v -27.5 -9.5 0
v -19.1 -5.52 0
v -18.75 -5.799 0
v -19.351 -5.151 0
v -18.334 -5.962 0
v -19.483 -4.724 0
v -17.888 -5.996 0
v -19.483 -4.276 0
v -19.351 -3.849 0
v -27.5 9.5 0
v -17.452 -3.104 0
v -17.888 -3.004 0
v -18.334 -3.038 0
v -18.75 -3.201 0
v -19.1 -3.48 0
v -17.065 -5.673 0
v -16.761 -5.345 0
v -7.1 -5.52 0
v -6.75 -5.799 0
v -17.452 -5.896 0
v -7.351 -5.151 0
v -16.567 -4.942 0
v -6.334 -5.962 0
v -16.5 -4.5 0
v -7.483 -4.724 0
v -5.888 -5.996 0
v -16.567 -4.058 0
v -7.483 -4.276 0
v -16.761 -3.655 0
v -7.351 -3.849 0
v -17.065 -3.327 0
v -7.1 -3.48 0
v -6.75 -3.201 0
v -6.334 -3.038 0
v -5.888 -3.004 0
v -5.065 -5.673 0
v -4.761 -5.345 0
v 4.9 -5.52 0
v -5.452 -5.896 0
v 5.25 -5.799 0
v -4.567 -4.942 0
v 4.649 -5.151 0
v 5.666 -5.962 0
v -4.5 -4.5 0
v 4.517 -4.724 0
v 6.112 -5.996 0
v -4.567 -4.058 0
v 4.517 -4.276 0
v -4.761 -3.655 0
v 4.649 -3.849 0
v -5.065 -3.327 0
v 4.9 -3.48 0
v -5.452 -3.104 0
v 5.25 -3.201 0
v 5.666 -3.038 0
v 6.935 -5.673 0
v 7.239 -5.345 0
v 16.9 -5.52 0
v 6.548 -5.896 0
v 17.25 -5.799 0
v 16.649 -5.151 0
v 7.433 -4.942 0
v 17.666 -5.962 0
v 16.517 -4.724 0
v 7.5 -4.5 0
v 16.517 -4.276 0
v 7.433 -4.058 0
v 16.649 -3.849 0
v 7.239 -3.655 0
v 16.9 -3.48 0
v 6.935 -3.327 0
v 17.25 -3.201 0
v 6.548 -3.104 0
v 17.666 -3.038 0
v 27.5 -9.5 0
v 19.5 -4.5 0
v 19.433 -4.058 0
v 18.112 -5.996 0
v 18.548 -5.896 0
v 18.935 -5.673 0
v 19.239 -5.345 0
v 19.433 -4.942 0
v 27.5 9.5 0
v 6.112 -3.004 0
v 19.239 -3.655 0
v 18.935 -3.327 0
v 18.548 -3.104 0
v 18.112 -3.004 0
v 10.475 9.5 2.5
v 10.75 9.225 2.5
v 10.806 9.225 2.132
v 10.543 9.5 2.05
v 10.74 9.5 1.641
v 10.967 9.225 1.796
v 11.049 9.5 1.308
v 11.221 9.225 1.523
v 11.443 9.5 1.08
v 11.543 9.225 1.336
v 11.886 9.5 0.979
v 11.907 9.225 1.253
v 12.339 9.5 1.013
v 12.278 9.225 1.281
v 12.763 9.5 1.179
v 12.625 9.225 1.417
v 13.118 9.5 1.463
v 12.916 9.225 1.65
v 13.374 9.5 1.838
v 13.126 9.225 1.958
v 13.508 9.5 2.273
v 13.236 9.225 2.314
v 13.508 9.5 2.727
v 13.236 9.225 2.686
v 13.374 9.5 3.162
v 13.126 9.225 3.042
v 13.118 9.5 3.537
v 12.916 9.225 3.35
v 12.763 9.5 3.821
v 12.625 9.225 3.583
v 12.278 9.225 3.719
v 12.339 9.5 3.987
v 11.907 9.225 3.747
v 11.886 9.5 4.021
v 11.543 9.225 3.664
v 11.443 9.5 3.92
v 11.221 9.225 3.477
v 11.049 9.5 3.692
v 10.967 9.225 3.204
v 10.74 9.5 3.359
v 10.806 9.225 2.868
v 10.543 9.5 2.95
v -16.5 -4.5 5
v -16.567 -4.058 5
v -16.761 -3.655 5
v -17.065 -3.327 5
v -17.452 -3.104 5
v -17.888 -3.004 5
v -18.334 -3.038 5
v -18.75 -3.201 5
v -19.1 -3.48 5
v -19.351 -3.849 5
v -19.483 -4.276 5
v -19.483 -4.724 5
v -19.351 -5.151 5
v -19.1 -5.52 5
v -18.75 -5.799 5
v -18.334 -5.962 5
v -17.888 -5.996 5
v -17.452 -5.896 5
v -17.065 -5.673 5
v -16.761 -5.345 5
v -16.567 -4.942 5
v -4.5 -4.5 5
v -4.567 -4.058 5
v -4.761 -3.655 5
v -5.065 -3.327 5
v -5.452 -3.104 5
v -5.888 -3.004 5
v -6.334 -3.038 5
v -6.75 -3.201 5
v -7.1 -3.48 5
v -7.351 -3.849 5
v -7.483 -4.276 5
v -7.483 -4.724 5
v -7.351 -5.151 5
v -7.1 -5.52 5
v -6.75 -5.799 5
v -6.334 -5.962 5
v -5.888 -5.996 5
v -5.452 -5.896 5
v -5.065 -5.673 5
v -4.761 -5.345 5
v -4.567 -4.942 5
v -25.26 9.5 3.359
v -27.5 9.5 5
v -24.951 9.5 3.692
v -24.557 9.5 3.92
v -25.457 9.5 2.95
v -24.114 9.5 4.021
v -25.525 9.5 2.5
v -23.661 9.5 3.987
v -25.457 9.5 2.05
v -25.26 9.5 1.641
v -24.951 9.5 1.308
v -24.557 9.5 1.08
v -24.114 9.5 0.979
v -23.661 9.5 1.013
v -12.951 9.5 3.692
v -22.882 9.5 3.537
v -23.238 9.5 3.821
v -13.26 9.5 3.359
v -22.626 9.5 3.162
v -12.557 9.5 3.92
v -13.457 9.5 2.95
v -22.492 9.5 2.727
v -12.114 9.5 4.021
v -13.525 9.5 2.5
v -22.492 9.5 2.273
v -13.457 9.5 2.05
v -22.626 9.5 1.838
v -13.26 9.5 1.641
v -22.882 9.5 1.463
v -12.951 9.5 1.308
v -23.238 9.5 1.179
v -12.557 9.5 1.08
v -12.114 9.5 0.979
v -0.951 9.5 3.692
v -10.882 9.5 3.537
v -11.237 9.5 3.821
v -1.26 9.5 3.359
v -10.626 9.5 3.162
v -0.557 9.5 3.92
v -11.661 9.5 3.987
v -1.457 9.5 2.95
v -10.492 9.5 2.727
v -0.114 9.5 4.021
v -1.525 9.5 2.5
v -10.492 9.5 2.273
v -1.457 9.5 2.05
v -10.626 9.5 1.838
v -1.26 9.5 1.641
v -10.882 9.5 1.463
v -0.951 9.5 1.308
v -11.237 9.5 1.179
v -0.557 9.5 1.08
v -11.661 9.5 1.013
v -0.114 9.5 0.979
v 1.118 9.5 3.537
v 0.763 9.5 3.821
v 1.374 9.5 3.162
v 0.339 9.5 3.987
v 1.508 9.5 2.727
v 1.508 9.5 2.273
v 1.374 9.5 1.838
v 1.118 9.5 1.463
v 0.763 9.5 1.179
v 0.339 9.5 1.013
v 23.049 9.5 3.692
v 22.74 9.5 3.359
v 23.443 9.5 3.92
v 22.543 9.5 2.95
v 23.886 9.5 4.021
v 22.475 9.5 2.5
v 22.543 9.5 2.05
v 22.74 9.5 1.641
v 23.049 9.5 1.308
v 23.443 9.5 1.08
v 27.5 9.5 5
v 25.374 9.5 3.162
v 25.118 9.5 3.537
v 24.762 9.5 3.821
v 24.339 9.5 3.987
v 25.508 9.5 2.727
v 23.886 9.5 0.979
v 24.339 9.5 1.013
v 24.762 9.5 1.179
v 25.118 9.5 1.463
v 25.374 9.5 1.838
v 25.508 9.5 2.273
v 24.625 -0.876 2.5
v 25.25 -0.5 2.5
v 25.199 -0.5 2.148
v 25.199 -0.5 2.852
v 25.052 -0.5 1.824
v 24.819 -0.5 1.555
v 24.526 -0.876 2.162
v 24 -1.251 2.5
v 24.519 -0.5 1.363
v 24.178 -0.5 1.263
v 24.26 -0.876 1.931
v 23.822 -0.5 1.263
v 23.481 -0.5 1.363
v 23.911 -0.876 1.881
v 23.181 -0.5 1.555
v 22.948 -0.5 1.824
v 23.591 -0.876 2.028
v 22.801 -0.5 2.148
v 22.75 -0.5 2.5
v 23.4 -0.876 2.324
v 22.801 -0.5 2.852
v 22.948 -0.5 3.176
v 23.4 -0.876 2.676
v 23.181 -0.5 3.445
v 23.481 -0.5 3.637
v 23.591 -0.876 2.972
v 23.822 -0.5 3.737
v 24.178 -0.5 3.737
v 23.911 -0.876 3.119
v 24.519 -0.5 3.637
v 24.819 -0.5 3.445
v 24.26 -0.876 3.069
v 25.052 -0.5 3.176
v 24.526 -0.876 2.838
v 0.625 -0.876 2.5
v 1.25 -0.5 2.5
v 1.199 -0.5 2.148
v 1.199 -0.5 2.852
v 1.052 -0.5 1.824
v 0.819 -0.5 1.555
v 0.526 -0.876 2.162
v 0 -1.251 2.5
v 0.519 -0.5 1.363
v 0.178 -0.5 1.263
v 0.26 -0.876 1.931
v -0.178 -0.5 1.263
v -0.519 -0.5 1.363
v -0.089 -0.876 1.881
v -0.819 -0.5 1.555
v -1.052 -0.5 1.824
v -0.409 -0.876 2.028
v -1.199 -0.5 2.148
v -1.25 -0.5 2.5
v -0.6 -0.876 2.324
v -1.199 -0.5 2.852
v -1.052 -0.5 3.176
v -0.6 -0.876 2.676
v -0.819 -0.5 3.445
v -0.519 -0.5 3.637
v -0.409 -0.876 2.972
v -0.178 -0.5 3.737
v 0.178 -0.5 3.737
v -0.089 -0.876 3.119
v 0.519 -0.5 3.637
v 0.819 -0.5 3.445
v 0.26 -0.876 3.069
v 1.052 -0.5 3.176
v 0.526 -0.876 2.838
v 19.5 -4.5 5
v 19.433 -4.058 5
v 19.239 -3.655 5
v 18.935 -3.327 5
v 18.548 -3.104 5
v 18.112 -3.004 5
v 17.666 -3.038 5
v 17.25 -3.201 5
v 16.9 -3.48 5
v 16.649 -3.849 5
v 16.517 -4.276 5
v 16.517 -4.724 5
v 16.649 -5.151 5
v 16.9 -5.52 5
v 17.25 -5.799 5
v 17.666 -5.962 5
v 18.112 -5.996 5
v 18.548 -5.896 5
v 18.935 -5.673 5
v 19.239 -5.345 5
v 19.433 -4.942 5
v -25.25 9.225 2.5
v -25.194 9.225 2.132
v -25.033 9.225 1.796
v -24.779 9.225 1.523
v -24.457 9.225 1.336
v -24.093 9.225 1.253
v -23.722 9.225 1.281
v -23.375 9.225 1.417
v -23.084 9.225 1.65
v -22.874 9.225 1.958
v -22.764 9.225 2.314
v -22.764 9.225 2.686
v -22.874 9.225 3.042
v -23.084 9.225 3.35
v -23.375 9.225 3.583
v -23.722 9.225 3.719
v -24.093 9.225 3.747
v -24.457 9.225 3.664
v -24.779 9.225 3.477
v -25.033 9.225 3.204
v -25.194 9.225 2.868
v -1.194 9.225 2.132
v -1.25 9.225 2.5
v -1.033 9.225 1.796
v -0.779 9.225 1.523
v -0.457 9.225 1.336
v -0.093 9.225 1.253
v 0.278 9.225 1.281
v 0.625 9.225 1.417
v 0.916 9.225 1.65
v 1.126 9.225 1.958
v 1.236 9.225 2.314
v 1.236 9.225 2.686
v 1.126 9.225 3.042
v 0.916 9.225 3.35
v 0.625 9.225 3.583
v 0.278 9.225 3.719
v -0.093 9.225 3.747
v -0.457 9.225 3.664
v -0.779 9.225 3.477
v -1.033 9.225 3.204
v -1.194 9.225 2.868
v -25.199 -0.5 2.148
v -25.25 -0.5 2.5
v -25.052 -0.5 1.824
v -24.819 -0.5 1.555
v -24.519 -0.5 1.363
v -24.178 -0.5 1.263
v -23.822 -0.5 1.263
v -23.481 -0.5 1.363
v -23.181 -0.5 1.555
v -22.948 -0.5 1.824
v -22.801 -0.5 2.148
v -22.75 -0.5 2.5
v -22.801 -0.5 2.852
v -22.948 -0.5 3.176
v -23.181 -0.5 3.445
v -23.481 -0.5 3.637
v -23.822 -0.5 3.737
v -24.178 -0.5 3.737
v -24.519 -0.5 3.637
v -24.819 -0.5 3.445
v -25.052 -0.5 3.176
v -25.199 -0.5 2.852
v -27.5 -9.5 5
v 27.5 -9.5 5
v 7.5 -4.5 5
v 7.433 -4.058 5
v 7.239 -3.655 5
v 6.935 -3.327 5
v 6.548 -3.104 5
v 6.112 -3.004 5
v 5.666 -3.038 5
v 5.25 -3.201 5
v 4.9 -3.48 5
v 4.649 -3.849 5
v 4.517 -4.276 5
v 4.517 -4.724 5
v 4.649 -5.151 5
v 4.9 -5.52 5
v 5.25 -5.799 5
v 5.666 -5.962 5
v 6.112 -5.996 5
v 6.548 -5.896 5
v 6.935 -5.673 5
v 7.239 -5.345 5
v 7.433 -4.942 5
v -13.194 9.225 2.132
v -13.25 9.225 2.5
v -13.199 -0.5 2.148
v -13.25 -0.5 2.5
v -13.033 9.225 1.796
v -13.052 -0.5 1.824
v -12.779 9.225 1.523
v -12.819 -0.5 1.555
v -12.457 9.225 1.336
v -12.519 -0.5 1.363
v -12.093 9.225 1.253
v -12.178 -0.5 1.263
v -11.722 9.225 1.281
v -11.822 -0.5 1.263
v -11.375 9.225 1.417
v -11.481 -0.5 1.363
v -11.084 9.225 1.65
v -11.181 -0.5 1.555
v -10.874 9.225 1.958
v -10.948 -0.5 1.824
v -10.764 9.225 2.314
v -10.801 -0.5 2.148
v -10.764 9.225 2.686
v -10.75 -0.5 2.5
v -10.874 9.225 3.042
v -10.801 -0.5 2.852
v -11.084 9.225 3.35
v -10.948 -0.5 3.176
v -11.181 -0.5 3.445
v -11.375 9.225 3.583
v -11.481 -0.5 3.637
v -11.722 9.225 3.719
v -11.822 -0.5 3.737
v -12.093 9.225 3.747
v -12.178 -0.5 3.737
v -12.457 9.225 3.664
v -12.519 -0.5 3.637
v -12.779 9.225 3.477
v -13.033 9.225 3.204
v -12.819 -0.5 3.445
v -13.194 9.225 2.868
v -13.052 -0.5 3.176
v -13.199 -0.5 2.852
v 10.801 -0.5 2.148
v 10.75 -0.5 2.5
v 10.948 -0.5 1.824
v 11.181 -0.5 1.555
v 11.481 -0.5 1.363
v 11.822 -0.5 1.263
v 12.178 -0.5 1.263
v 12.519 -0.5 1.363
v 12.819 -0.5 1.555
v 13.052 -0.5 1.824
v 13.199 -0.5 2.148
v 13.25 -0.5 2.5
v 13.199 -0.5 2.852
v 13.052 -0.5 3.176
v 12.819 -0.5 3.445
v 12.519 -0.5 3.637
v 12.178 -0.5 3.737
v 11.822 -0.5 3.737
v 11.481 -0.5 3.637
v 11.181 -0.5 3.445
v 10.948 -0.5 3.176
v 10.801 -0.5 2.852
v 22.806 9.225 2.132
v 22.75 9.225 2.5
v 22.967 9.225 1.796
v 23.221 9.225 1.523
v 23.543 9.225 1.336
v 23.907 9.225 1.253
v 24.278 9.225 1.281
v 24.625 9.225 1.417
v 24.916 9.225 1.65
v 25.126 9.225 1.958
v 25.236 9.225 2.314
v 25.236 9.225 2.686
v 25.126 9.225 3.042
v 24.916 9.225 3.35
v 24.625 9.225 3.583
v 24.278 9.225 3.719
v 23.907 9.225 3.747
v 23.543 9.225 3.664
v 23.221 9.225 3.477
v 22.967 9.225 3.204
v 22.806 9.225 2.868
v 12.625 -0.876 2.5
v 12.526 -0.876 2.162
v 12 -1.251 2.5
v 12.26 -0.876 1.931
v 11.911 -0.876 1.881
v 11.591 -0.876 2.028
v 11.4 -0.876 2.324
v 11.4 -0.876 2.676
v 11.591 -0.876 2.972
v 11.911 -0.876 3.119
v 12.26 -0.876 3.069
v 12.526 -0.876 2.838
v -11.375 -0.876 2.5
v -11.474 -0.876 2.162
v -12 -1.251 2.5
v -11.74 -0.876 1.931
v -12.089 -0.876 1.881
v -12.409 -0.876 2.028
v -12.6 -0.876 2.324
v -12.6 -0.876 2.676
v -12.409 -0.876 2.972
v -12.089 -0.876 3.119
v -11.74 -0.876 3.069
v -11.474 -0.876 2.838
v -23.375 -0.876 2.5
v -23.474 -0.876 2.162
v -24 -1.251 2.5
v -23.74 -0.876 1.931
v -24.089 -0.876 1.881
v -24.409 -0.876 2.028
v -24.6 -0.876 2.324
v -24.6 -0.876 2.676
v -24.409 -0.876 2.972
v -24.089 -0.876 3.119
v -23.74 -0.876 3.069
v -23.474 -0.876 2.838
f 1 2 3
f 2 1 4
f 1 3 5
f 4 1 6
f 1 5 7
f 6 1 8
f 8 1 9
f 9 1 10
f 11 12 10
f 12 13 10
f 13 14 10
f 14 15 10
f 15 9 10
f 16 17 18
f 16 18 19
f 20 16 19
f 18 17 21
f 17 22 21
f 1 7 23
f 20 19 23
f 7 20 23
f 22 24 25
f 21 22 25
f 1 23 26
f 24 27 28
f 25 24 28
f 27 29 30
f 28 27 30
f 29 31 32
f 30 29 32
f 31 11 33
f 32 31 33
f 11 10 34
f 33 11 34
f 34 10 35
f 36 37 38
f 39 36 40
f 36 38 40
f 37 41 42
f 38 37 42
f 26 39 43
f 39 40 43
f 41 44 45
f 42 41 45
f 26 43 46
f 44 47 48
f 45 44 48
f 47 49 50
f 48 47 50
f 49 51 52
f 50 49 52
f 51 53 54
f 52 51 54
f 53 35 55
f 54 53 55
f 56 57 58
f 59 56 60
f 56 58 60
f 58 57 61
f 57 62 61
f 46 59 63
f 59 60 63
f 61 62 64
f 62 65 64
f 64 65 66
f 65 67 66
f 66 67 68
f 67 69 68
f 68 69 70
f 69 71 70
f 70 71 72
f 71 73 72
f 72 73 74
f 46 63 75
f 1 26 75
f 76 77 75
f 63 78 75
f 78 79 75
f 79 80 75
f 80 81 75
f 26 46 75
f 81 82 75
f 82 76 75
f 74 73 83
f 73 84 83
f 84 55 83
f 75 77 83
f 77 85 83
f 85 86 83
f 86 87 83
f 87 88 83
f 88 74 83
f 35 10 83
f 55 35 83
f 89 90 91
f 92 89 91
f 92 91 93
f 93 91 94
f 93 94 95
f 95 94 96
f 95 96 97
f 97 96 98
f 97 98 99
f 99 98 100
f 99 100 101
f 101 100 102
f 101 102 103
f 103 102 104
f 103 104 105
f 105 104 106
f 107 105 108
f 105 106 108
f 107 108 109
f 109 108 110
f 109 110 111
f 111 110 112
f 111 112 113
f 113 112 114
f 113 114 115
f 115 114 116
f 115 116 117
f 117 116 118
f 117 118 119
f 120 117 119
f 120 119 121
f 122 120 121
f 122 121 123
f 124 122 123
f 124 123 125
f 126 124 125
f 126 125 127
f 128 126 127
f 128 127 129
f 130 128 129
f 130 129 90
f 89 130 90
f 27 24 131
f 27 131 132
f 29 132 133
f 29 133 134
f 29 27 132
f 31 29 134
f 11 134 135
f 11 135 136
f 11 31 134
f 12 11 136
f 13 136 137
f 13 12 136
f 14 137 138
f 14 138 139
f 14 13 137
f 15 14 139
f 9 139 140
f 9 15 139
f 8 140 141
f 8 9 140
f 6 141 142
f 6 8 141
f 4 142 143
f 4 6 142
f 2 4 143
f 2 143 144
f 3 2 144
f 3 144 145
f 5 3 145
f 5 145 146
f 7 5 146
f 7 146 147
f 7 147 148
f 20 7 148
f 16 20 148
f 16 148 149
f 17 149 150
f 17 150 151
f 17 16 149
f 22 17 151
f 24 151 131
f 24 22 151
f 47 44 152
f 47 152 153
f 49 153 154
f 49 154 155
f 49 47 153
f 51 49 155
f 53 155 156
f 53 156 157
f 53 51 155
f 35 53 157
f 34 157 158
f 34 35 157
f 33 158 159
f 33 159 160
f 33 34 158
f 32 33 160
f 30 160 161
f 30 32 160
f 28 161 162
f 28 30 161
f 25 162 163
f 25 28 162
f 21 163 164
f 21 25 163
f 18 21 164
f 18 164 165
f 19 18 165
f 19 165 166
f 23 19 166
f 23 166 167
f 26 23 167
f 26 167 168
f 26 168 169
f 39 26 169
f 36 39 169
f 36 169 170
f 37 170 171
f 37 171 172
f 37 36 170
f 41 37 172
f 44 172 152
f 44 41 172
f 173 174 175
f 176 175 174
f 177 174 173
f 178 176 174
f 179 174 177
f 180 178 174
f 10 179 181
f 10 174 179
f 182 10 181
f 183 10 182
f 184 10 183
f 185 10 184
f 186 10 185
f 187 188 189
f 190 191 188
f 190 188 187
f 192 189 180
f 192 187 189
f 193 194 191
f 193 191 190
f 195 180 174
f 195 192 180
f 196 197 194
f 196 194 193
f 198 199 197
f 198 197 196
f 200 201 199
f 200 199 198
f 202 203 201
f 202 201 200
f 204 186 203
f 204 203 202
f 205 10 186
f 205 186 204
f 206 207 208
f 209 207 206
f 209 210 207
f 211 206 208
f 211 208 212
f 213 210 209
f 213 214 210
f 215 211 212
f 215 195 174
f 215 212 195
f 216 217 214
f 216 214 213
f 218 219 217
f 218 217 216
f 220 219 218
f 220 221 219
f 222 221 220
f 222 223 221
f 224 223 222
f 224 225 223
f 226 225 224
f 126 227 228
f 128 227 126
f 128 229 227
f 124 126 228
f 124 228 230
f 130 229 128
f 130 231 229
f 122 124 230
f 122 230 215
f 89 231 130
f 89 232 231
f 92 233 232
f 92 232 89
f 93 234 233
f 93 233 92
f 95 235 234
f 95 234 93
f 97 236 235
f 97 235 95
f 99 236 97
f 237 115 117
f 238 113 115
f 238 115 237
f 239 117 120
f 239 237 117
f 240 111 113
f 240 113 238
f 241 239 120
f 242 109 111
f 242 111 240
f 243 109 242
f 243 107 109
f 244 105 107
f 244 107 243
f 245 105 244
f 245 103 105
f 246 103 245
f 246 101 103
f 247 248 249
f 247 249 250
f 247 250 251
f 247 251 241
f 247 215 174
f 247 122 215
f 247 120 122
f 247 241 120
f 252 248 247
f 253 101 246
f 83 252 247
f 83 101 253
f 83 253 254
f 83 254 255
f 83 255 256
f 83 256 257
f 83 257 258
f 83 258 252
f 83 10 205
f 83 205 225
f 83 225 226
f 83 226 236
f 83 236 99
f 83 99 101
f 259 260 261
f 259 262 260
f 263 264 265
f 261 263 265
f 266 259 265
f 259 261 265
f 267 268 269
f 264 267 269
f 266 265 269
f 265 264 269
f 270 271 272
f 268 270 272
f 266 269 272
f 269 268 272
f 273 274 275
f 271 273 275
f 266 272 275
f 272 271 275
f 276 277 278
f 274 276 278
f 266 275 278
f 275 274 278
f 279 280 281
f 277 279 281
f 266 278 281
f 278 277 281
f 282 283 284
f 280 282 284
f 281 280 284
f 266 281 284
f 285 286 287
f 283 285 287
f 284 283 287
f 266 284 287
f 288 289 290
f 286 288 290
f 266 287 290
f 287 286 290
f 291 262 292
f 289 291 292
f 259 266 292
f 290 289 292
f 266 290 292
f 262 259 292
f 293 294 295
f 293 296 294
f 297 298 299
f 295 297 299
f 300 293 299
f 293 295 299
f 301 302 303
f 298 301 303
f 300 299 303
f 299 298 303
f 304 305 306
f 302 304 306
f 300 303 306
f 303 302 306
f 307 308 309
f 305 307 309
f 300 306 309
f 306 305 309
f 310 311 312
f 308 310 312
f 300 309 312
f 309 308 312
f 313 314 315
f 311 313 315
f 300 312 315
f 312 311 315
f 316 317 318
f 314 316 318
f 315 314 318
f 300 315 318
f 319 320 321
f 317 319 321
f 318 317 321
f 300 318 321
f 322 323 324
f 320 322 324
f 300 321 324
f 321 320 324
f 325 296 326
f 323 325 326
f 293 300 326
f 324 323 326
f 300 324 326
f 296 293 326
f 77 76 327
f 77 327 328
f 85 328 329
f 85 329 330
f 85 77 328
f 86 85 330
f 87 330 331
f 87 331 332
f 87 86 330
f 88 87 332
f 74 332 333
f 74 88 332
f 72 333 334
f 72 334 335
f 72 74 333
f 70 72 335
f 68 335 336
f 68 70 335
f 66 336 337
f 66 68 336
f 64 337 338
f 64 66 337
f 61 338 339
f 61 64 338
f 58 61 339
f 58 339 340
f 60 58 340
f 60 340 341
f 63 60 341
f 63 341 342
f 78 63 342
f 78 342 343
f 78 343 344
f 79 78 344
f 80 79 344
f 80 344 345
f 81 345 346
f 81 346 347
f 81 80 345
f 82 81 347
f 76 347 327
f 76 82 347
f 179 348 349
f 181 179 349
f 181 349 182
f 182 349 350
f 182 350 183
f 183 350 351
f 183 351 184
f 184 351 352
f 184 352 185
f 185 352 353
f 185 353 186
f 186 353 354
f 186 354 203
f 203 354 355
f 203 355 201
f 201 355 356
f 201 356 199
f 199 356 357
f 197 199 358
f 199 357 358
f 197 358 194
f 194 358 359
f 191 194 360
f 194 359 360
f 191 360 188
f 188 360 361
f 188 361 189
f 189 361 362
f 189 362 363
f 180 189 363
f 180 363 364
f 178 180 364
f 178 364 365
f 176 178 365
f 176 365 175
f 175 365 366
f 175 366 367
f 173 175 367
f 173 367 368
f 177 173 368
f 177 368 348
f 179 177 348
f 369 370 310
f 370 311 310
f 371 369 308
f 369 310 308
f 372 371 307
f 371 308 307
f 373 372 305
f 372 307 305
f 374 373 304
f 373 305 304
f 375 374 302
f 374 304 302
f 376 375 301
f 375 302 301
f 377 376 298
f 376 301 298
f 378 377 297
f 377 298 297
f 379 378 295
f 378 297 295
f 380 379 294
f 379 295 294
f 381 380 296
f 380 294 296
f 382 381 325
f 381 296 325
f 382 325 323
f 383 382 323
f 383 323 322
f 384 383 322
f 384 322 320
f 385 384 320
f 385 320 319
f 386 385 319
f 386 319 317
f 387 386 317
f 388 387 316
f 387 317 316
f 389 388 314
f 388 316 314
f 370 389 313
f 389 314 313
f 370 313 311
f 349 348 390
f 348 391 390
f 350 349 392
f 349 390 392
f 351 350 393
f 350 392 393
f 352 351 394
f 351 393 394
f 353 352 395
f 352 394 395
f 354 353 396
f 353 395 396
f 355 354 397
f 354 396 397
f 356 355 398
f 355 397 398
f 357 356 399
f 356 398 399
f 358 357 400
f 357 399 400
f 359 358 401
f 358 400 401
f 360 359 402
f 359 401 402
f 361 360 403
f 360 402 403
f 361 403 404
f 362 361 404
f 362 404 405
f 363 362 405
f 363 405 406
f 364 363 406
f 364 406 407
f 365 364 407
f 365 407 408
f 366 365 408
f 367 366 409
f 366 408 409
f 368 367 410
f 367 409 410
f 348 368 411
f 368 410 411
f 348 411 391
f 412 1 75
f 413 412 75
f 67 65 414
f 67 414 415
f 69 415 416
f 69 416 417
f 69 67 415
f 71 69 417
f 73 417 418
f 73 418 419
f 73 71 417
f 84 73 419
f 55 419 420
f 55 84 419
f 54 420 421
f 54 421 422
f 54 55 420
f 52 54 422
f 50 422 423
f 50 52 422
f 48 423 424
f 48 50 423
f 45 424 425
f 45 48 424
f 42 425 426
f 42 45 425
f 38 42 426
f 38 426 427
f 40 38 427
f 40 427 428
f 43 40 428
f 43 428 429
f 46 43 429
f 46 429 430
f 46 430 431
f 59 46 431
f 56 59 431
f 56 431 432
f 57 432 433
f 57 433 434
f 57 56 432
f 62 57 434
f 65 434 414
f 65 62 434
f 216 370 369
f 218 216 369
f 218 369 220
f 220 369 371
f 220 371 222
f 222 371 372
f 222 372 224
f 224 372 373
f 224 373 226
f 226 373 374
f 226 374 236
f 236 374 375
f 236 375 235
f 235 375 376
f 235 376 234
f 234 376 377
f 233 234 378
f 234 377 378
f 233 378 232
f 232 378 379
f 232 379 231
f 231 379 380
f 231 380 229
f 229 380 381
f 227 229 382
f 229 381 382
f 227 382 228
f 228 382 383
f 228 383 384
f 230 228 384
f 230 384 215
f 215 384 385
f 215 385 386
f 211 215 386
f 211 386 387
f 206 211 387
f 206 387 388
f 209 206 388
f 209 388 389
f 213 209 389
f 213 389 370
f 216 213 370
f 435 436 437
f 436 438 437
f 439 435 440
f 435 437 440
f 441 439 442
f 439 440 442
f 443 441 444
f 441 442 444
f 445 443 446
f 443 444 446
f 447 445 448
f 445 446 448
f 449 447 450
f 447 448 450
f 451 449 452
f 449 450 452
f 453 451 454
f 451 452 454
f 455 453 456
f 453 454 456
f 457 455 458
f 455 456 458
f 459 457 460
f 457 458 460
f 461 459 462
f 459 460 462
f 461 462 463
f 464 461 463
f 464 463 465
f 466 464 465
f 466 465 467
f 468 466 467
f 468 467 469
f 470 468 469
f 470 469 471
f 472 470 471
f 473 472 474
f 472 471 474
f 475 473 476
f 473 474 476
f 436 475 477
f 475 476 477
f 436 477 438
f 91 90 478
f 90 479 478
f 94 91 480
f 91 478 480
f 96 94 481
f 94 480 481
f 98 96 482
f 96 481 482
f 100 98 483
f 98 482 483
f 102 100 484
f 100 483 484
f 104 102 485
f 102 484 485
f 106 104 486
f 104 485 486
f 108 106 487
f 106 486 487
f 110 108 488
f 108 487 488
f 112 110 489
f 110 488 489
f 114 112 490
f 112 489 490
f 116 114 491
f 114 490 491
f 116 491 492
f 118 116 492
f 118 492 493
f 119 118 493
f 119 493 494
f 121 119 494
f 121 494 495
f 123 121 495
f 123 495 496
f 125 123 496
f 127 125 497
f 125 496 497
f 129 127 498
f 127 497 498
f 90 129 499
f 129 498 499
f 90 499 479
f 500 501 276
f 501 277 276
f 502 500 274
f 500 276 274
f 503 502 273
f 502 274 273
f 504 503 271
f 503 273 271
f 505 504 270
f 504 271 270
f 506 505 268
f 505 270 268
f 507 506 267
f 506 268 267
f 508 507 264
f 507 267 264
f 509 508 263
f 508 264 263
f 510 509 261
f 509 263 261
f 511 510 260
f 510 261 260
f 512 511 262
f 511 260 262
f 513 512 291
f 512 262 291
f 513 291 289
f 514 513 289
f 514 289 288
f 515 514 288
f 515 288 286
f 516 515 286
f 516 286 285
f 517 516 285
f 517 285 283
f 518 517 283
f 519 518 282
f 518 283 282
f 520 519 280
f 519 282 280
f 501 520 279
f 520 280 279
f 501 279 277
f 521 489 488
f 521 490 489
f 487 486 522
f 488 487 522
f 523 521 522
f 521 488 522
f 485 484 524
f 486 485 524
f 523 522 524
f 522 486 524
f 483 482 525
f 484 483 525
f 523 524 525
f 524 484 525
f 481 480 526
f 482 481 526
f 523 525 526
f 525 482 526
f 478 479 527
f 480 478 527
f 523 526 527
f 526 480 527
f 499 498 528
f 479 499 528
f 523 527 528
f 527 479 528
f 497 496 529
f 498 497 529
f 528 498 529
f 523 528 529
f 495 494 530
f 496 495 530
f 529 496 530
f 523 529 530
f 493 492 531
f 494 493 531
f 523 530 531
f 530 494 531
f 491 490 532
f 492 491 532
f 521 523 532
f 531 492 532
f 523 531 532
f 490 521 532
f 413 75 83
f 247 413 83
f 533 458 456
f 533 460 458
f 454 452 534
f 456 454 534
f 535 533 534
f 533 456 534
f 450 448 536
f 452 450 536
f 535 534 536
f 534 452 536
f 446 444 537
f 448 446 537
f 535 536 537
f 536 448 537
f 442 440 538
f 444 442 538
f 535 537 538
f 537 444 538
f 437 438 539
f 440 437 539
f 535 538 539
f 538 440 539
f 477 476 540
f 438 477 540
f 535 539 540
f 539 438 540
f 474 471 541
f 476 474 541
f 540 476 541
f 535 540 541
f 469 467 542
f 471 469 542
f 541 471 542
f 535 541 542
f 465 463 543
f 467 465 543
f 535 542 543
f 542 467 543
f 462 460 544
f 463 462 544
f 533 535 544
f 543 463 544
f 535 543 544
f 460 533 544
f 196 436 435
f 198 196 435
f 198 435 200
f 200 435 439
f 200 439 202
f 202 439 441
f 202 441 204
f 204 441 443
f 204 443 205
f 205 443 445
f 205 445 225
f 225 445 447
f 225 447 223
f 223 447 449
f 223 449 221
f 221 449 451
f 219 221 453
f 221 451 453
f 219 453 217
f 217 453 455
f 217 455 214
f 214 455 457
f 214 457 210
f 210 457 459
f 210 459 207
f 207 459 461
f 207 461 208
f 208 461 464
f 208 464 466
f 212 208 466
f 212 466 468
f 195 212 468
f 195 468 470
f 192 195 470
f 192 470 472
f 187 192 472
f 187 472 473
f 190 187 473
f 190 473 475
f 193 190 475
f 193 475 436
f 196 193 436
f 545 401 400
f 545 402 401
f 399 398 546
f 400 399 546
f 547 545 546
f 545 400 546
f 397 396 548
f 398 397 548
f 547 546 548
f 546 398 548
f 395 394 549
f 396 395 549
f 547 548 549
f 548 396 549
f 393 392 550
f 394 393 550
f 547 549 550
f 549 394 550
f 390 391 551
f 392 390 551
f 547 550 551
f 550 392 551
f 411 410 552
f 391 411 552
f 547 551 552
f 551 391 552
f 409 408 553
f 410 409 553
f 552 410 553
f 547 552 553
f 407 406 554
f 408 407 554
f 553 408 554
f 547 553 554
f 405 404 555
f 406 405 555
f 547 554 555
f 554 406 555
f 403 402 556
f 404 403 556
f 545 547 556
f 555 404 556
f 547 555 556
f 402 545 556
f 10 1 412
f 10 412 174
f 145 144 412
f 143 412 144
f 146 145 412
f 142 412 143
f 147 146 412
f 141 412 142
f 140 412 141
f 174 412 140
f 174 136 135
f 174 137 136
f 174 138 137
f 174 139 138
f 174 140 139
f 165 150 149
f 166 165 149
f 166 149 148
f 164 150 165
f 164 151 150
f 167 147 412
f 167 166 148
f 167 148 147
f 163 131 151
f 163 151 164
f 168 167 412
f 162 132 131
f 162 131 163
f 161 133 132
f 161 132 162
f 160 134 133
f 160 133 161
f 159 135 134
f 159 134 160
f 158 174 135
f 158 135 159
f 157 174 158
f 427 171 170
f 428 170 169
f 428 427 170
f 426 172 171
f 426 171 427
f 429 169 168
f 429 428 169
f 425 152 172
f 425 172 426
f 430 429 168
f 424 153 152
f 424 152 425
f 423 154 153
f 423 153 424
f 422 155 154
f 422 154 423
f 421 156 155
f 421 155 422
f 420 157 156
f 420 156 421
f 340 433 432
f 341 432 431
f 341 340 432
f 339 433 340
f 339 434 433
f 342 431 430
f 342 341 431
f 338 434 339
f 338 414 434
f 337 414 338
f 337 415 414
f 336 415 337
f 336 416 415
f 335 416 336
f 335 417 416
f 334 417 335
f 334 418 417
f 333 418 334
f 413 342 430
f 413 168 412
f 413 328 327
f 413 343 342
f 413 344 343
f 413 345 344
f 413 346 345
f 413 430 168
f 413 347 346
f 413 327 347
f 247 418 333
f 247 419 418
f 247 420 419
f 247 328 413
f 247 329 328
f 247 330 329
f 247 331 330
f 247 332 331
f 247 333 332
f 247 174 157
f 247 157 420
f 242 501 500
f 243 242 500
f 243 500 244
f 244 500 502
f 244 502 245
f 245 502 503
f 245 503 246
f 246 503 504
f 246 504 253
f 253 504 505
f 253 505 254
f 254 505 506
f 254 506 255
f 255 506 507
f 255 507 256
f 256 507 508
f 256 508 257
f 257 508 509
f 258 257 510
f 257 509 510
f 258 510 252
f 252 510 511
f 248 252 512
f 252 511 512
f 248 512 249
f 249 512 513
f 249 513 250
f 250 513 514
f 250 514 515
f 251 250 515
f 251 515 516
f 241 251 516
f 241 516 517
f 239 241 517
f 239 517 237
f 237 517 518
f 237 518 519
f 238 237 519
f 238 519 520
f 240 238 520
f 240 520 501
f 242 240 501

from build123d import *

# Parameters (mm, degrees)
SKETCH_1_W                   = 55
SKETCH_1_H                   = 19
SKETCH_1_R                   = 1.5
EXTRUDE_1_DEPTH              = 5
HOLE_WIZARD_M3_2_D           = 2.5
HOLE_WIZARD_M3_2_DEPTH       = 10
HOLE_WIZARD_M3_2_CSINK_D     = 3.05
HOLE_WIZARD_M3_2_CSINK_ANGLE = 90
HOLE_WIZARD_M3_2_TIP         = 0.751075774


with BuildPart() as part:
    # 草圖1 → 填料-伸長1 (new body)
    with BuildSketch(Plane.XY):
        Rectangle(SKETCH_1_W, SKETCH_1_H)
        with Locations((18, -4.5)):
            Circle(SKETCH_1_R, mode=Mode.SUBTRACT)
        with Locations((6, -4.5)):
            Circle(SKETCH_1_R, mode=Mode.SUBTRACT)
        with Locations((-6, -4.5)):
            Circle(SKETCH_1_R, mode=Mode.SUBTRACT)
        with Locations((-18, -4.5)):
            Circle(SKETCH_1_R, mode=Mode.SUBTRACT)
    extrude(amount=EXTRUDE_1_DEPTH)

    # M3 螺紋孔2
    with Locations(Plane(origin=(-24, 9.5, 2.5), x_dir=(1, 0, 0), z_dir=(0, 1, 0))):
        with Locations((0, 0), (12, 0), (24, 0), (36, 0), (48, 0)):
            CounterSinkHole(HOLE_WIZARD_M3_2_D / 2, HOLE_WIZARD_M3_2_CSINK_D / 2, depth=HOLE_WIZARD_M3_2_DEPTH, counter_sink_angle=HOLE_WIZARD_M3_2_CSINK_ANGLE)
            with Locations((0, 0, -(HOLE_WIZARD_M3_2_DEPTH + HOLE_WIZARD_M3_2_TIP / 2))):  # 118° drill point
                Cone(0, HOLE_WIZARD_M3_2_D / 2, HOLE_WIZARD_M3_2_TIP, mode=Mode.SUBTRACT)


solid = part.part
